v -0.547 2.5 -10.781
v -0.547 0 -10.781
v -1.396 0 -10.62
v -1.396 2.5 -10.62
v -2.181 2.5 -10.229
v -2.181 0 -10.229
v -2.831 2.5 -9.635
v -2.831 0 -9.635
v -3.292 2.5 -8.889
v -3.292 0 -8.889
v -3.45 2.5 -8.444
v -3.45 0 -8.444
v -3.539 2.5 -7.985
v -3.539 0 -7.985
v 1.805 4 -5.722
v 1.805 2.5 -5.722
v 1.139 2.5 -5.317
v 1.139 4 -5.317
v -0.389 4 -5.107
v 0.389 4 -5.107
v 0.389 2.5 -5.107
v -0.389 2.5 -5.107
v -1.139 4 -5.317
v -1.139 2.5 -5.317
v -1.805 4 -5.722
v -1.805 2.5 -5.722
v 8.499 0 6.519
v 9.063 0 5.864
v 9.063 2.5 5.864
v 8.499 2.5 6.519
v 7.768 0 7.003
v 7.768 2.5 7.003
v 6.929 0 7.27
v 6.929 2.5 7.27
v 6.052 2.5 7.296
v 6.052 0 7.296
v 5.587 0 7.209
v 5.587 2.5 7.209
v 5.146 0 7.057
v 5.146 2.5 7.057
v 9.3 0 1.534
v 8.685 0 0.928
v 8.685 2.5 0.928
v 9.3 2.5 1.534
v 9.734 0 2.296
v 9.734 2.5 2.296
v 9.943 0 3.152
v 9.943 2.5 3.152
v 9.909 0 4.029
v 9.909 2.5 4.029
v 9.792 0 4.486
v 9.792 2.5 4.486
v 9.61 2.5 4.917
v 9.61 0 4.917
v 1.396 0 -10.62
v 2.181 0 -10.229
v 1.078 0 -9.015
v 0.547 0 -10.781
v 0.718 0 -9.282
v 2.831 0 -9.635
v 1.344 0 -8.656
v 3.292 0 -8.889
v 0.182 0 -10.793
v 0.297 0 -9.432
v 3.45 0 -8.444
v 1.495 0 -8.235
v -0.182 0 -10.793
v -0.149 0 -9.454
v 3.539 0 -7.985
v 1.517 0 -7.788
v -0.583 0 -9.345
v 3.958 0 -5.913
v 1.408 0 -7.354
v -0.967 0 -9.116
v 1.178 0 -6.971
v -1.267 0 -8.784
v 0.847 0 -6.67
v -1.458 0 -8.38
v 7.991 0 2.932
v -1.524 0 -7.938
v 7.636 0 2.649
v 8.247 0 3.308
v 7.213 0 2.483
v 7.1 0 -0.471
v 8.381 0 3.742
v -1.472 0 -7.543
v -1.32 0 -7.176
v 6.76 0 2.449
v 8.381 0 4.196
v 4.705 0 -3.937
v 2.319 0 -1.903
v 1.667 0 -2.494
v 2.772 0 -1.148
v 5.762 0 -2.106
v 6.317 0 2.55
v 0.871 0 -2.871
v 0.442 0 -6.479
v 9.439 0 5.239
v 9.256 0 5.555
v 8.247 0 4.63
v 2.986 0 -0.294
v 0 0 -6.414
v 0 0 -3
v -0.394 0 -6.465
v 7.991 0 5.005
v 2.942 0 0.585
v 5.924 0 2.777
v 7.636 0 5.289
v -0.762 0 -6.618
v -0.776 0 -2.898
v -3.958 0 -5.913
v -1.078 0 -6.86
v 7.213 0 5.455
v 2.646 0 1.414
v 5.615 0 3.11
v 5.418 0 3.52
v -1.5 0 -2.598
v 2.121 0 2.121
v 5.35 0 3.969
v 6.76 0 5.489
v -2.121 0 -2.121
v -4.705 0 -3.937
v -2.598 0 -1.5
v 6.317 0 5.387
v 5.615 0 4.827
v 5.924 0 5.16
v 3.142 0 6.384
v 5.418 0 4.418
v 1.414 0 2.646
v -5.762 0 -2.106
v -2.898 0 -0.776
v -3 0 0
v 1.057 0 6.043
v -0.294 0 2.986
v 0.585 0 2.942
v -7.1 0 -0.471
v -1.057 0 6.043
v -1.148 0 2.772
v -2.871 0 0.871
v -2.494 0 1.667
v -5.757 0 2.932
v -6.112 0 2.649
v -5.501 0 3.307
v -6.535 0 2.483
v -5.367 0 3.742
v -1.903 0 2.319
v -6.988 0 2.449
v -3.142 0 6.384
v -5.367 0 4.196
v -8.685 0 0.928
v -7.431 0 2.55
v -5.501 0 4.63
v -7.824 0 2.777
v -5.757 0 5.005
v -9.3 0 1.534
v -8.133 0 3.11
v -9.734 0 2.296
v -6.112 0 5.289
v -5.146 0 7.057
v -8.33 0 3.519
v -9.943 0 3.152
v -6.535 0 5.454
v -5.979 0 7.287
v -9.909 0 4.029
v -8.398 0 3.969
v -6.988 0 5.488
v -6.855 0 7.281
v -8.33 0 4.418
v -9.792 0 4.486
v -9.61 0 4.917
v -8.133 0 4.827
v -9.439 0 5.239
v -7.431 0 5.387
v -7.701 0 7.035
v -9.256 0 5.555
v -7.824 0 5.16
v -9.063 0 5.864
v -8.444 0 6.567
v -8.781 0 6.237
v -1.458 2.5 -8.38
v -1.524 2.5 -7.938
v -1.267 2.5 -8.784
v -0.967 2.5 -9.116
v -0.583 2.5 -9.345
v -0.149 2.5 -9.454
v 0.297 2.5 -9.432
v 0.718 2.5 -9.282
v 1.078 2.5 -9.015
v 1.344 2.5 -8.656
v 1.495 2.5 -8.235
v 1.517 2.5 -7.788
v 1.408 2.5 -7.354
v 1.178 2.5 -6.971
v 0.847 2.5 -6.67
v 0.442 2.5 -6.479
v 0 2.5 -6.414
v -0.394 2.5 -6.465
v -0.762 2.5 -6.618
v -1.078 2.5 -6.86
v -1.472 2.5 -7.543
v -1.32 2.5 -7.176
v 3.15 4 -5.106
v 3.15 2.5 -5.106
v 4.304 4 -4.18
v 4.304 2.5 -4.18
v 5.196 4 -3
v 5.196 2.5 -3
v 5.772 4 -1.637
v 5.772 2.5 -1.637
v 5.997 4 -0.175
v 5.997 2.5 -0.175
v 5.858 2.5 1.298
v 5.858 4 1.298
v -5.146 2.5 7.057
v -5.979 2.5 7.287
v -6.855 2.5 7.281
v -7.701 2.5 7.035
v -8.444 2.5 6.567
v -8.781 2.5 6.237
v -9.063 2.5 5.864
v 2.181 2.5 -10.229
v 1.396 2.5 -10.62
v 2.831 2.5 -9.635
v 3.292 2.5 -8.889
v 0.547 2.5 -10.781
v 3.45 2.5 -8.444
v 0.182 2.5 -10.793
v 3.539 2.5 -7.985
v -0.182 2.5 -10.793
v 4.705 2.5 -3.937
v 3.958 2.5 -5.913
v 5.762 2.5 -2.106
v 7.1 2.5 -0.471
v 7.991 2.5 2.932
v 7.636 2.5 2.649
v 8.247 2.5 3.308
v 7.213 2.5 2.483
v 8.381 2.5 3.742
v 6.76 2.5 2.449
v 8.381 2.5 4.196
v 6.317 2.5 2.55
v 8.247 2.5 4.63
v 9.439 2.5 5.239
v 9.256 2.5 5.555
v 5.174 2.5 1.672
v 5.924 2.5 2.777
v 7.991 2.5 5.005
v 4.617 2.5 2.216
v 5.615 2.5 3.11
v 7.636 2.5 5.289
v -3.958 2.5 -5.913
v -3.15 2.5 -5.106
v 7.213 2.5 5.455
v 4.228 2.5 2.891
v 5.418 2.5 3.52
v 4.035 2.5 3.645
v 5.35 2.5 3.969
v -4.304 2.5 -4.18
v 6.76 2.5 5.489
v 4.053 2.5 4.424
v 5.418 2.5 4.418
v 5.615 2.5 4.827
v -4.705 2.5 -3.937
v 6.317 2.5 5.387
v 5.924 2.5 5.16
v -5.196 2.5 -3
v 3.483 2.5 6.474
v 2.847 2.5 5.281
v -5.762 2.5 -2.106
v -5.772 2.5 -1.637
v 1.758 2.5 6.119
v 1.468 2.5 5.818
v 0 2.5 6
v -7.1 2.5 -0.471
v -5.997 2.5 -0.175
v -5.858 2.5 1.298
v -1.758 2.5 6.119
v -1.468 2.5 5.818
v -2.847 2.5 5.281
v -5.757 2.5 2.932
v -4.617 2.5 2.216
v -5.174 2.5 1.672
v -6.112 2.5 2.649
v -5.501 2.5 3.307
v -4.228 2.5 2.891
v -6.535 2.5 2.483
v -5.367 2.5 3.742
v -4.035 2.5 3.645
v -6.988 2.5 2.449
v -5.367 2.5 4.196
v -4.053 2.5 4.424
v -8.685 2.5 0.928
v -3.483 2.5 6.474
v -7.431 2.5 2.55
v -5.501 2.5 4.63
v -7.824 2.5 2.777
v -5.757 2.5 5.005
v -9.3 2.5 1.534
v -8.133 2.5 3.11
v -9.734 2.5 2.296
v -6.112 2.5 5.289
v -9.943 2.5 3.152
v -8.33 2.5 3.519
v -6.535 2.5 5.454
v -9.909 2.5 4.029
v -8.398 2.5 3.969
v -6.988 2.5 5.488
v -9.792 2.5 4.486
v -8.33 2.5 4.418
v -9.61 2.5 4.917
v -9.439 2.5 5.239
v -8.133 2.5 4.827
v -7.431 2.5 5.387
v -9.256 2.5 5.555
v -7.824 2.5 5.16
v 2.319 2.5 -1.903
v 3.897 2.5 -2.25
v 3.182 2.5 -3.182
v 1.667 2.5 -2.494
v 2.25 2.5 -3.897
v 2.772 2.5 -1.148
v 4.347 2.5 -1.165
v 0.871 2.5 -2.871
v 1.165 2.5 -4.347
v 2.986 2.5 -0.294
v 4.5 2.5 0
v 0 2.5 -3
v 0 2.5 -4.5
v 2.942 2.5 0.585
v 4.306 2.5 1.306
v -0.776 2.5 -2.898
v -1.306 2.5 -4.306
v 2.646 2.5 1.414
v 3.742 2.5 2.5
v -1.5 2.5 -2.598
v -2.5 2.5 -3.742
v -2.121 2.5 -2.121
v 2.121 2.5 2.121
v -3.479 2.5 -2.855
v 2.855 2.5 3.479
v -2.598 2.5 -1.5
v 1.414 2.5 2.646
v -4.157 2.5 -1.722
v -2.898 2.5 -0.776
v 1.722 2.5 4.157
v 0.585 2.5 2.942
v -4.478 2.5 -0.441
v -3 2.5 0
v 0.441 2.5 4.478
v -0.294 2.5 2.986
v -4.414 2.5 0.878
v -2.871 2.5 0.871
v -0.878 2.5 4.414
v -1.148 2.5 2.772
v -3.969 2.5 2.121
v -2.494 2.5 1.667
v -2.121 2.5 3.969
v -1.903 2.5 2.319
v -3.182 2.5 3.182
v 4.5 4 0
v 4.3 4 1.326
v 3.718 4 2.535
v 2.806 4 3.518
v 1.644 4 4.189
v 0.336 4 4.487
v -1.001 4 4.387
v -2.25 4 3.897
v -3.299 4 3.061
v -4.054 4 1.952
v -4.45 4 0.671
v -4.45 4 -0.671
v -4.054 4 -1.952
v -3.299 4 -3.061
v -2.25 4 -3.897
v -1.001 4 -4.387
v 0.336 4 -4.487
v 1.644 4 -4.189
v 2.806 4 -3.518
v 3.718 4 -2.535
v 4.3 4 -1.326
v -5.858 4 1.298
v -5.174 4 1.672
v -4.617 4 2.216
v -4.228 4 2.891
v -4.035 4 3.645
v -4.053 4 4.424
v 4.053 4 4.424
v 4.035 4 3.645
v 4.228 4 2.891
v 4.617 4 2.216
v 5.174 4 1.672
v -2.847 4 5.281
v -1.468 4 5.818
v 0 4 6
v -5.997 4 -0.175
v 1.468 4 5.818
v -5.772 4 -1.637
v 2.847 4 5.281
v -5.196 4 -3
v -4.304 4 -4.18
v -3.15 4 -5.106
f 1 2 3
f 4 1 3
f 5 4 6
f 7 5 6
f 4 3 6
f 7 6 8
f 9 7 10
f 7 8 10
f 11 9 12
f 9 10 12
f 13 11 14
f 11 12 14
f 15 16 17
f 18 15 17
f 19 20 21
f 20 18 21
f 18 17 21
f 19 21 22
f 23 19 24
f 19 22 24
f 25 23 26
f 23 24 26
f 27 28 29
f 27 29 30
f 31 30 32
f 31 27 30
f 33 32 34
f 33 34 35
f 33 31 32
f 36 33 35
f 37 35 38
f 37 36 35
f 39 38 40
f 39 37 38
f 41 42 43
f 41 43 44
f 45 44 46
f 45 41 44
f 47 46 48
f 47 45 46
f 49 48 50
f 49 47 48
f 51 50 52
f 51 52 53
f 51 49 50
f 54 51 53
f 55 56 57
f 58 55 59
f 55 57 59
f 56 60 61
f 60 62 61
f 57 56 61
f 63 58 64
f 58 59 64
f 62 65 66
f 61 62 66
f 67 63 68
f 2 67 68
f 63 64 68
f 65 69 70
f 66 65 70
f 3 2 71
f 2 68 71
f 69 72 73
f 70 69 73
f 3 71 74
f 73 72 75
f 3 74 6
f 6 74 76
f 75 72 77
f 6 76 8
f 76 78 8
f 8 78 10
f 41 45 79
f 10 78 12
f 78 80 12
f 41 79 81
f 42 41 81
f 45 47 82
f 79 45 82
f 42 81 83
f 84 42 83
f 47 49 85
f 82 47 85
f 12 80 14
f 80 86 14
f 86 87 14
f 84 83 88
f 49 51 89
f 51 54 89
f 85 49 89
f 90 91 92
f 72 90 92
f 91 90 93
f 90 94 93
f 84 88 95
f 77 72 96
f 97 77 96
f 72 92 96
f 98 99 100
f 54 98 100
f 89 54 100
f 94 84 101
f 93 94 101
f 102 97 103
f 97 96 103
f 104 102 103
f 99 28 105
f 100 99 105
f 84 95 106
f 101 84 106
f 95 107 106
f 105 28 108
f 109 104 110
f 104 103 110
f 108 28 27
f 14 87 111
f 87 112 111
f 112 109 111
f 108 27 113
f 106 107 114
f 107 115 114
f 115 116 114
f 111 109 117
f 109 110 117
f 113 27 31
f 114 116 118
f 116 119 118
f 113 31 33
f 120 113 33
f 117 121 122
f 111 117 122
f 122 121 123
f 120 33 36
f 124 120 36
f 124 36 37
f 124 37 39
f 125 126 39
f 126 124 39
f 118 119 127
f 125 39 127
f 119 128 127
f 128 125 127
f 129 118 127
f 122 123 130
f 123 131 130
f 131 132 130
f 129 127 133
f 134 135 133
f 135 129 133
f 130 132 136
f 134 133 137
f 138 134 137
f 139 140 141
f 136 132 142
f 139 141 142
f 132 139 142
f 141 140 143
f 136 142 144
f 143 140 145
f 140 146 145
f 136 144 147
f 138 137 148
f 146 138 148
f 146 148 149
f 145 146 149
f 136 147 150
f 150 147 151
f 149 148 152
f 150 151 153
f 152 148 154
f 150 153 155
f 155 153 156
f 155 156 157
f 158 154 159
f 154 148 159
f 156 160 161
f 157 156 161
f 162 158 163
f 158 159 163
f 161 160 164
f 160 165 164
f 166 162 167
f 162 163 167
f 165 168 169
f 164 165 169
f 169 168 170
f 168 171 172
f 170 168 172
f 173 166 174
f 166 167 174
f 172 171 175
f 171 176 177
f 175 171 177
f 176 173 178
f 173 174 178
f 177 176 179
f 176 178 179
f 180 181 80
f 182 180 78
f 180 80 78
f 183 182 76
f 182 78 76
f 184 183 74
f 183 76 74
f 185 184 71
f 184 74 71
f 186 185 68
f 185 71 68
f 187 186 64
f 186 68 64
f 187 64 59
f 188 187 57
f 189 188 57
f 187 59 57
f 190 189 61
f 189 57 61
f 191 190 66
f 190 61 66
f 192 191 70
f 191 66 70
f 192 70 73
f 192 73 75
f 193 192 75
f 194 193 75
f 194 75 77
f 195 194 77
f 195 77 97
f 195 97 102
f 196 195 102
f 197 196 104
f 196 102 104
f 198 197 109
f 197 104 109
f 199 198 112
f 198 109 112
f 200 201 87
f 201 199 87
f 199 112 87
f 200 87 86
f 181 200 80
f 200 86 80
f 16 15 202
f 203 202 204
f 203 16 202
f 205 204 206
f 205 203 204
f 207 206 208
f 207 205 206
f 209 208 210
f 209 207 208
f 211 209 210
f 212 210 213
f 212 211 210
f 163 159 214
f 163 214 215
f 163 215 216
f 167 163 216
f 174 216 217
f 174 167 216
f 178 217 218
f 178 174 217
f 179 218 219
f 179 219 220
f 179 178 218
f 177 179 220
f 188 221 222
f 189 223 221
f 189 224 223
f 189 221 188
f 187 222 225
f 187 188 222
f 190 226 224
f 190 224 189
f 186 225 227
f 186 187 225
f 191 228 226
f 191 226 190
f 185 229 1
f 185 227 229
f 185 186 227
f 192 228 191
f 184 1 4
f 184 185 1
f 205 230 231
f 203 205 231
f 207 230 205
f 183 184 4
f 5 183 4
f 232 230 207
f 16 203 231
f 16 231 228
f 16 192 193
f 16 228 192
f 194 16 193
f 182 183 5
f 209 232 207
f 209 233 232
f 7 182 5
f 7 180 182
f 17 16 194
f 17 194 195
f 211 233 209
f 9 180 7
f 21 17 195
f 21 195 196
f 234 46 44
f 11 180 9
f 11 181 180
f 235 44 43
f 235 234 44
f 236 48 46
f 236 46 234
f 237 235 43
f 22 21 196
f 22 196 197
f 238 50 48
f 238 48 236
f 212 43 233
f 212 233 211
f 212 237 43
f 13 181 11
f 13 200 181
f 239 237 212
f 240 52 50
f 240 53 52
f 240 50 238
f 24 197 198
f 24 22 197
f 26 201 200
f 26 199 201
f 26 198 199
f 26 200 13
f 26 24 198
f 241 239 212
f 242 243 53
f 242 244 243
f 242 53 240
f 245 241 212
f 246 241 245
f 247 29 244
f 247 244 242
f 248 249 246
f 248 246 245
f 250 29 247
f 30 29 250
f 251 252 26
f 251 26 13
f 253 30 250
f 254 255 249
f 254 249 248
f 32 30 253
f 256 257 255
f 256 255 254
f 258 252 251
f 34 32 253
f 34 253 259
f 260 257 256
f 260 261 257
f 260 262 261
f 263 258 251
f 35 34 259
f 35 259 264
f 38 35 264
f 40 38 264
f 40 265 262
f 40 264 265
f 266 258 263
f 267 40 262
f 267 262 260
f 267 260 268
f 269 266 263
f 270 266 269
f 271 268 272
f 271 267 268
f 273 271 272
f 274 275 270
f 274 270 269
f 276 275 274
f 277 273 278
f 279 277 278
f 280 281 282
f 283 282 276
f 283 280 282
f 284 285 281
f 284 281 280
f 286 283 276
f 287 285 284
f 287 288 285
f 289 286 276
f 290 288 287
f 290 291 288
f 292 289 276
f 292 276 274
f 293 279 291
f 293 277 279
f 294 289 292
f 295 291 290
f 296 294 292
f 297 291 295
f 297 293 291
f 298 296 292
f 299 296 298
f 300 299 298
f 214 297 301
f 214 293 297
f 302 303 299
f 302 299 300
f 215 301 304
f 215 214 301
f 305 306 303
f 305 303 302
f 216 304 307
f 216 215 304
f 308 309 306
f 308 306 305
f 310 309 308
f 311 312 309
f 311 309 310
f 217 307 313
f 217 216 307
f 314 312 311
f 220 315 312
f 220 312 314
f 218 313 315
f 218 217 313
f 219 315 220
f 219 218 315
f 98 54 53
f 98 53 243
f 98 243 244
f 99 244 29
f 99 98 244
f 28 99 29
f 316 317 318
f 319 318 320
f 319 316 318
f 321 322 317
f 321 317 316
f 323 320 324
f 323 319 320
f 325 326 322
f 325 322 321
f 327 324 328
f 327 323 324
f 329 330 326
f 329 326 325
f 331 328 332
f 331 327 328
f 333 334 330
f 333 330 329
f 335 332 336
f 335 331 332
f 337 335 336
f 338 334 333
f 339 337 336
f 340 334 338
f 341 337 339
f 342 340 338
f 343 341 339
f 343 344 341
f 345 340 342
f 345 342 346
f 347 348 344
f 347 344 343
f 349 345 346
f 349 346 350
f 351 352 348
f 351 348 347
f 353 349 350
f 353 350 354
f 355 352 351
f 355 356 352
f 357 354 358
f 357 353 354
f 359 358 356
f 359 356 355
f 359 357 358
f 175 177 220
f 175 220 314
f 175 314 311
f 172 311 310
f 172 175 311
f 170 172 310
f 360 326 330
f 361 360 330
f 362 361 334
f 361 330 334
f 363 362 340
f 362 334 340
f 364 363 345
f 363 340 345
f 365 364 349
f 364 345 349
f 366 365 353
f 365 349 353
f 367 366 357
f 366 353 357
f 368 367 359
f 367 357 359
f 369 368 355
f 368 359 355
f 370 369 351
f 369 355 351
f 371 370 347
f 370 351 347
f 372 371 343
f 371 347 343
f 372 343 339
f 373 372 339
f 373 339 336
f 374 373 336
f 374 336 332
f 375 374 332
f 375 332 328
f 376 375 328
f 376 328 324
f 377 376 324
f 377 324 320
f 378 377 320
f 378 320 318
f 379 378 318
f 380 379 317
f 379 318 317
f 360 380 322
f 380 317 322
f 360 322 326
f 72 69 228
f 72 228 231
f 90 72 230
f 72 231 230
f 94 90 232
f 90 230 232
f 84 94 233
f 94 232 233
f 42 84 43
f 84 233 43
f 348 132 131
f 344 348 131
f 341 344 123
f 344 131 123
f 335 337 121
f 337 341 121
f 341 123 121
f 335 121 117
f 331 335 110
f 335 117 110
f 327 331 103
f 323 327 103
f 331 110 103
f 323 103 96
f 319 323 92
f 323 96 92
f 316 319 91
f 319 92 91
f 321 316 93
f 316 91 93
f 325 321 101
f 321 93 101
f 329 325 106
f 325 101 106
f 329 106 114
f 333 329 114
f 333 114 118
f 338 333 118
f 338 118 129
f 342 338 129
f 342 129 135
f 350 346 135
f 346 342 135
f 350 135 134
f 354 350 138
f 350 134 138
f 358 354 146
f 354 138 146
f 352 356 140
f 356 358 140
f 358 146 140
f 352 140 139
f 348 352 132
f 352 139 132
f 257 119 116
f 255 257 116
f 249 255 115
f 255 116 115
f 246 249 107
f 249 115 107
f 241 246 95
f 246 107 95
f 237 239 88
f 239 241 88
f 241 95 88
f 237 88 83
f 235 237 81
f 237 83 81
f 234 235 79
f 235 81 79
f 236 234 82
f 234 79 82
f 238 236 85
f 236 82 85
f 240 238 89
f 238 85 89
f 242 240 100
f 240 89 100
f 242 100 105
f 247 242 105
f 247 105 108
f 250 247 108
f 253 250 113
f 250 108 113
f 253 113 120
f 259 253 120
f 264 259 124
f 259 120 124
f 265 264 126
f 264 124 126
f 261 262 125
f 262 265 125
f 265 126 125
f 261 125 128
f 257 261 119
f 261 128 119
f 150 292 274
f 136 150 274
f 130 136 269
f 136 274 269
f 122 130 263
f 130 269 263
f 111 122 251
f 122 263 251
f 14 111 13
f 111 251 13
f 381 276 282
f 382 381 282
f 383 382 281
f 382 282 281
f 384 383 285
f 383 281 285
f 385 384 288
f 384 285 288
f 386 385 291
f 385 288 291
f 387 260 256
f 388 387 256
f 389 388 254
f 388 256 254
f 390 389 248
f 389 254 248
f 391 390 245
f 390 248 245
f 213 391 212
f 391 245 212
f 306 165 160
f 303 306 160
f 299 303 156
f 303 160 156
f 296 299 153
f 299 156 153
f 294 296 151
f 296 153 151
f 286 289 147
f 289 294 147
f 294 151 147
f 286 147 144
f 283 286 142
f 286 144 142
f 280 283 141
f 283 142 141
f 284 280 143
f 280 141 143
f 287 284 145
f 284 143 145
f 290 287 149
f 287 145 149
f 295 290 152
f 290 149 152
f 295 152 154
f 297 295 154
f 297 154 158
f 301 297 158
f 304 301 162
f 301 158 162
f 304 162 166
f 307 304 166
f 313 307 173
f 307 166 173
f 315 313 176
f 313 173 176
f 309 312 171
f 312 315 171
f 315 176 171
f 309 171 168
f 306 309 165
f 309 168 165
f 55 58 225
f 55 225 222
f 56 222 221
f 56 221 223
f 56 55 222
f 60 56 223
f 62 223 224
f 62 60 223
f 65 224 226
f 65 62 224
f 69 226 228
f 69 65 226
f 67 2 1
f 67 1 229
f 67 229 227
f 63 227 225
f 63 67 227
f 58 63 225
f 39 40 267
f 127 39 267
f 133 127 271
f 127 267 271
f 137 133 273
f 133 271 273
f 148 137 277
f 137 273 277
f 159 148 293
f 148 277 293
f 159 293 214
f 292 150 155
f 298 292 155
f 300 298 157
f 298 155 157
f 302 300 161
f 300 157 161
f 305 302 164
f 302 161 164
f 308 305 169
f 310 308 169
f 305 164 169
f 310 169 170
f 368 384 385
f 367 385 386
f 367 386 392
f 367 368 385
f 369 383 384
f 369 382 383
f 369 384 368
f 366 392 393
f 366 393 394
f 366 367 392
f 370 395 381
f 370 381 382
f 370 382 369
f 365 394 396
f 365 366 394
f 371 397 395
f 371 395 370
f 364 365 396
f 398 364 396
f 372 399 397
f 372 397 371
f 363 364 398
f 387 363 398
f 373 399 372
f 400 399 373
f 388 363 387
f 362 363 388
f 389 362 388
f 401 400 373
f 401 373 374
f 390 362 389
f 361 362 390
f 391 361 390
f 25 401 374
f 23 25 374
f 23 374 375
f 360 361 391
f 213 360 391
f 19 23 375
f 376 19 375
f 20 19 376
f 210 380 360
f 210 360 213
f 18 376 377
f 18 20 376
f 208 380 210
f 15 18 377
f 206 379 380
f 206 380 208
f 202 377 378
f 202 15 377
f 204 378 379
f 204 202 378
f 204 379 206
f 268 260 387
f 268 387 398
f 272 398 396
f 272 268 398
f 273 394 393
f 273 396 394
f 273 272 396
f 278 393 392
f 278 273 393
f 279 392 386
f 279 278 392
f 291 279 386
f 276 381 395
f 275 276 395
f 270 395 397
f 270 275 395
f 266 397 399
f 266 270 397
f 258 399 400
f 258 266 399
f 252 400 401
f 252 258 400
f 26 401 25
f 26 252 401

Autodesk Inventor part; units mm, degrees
ref_plane "YZ Plane" through (0, 0, 0) normal (1, 0, 0) x (0, 1, 0)
ref_plane "XZ Plane" through (0, 0, 0) normal (0, 1, 0) x (-1, 0, 0)
ref_plane "XY Plane" through (0, 0, 0) normal (0, 0, 1) x (1, 0, 0)
sketch "Sketch7" plane through (0, 0, 0) normal (0, 1, 0) x (-1, 0, 0)
  line L0 (0, 0) -> (0, -7.9375)
  circle A0 centre (0, -7.9375) radius 1.524
  circle A1 centre (0, 0) radius 3
  circle A2 centre (6.8741, 3.9687) radius 1.524
  circle A3 centre (-6.8741, 3.9688) radius 1.524
  circle A4 centre (0, 0) radius 10.795
  dimension "d32" = 7.9375
  dimension "d33" = 3.048
  dimension "d34" = 6
  dimension "d37" = 360
  dimension "d39" = 21.59
extrude "Extrusion6" add sketch "Sketch7" along normal blind 2.5
sketch "Sketch8" plane through (0, 2.5, 0) normal (0, 1, 0) x (1, 0, 0)
  circle A0 centre (0, 0) radius 4.5
  circle A1 centre (0, 0) radius 6
  dimension "d42" = 9
  dimension "d43" = 12
extrude "Extrusion7" add sketch "Sketch8" along normal blind 1.5
sketch "Sketch9" plane through (0, 2.5, 0) normal (0, 1, 0) x (1, 0, 0)
  circle A0 centre (0, 7.9375) radius 1.524 projected
  circle A1 centre (0, 7.9375) radius 2.8575
  circle A2 centre (-6.8741, -3.9687) radius 2.8575
  circle A3 centre (6.8741, -3.9688) radius 2.8575
  point P0 (0, 0)
  dimension "d46" = 5.715
  dimension "d49" = 360
extrude "Extrusion8" cut sketch "Sketch9" along normal blind 1.5
sketch "Sketch10" plane through (0, 2.5, 0) normal (0, 1, 0) x (1, 0, 0)
  line L0 (0, 0) -> (16.4978, 9.525)
  line L1 (0, 0) -> (19.05, 0) construction
  circle A0 centre (16.4978, 9.525) radius 13.05
  circle A1 centre (-16.4978, 9.525) radius 13.05
  circle A2 centre (0, -19.05) radius 13.05
  dimension "d53" = 19.05
  dimension "d54" = 30
  dimension "d57" = 360
extrude "Extrusion9" cut sketch "Sketch10" against normal through all
fillet "Fillet1" radius 3.175 6 edges at (-3.4665, 1.25, -10.2233) (-10.5869, 1.25, 2.1096) (3.4665, 1.25, -10.2233) (10.5869, 1.25, 2.1096) (7.1204, 1.25, 8.1137) (-7.1204, 1.25, 8.1137)
properties part number "bearingHousing" material "ABS Plastic"
